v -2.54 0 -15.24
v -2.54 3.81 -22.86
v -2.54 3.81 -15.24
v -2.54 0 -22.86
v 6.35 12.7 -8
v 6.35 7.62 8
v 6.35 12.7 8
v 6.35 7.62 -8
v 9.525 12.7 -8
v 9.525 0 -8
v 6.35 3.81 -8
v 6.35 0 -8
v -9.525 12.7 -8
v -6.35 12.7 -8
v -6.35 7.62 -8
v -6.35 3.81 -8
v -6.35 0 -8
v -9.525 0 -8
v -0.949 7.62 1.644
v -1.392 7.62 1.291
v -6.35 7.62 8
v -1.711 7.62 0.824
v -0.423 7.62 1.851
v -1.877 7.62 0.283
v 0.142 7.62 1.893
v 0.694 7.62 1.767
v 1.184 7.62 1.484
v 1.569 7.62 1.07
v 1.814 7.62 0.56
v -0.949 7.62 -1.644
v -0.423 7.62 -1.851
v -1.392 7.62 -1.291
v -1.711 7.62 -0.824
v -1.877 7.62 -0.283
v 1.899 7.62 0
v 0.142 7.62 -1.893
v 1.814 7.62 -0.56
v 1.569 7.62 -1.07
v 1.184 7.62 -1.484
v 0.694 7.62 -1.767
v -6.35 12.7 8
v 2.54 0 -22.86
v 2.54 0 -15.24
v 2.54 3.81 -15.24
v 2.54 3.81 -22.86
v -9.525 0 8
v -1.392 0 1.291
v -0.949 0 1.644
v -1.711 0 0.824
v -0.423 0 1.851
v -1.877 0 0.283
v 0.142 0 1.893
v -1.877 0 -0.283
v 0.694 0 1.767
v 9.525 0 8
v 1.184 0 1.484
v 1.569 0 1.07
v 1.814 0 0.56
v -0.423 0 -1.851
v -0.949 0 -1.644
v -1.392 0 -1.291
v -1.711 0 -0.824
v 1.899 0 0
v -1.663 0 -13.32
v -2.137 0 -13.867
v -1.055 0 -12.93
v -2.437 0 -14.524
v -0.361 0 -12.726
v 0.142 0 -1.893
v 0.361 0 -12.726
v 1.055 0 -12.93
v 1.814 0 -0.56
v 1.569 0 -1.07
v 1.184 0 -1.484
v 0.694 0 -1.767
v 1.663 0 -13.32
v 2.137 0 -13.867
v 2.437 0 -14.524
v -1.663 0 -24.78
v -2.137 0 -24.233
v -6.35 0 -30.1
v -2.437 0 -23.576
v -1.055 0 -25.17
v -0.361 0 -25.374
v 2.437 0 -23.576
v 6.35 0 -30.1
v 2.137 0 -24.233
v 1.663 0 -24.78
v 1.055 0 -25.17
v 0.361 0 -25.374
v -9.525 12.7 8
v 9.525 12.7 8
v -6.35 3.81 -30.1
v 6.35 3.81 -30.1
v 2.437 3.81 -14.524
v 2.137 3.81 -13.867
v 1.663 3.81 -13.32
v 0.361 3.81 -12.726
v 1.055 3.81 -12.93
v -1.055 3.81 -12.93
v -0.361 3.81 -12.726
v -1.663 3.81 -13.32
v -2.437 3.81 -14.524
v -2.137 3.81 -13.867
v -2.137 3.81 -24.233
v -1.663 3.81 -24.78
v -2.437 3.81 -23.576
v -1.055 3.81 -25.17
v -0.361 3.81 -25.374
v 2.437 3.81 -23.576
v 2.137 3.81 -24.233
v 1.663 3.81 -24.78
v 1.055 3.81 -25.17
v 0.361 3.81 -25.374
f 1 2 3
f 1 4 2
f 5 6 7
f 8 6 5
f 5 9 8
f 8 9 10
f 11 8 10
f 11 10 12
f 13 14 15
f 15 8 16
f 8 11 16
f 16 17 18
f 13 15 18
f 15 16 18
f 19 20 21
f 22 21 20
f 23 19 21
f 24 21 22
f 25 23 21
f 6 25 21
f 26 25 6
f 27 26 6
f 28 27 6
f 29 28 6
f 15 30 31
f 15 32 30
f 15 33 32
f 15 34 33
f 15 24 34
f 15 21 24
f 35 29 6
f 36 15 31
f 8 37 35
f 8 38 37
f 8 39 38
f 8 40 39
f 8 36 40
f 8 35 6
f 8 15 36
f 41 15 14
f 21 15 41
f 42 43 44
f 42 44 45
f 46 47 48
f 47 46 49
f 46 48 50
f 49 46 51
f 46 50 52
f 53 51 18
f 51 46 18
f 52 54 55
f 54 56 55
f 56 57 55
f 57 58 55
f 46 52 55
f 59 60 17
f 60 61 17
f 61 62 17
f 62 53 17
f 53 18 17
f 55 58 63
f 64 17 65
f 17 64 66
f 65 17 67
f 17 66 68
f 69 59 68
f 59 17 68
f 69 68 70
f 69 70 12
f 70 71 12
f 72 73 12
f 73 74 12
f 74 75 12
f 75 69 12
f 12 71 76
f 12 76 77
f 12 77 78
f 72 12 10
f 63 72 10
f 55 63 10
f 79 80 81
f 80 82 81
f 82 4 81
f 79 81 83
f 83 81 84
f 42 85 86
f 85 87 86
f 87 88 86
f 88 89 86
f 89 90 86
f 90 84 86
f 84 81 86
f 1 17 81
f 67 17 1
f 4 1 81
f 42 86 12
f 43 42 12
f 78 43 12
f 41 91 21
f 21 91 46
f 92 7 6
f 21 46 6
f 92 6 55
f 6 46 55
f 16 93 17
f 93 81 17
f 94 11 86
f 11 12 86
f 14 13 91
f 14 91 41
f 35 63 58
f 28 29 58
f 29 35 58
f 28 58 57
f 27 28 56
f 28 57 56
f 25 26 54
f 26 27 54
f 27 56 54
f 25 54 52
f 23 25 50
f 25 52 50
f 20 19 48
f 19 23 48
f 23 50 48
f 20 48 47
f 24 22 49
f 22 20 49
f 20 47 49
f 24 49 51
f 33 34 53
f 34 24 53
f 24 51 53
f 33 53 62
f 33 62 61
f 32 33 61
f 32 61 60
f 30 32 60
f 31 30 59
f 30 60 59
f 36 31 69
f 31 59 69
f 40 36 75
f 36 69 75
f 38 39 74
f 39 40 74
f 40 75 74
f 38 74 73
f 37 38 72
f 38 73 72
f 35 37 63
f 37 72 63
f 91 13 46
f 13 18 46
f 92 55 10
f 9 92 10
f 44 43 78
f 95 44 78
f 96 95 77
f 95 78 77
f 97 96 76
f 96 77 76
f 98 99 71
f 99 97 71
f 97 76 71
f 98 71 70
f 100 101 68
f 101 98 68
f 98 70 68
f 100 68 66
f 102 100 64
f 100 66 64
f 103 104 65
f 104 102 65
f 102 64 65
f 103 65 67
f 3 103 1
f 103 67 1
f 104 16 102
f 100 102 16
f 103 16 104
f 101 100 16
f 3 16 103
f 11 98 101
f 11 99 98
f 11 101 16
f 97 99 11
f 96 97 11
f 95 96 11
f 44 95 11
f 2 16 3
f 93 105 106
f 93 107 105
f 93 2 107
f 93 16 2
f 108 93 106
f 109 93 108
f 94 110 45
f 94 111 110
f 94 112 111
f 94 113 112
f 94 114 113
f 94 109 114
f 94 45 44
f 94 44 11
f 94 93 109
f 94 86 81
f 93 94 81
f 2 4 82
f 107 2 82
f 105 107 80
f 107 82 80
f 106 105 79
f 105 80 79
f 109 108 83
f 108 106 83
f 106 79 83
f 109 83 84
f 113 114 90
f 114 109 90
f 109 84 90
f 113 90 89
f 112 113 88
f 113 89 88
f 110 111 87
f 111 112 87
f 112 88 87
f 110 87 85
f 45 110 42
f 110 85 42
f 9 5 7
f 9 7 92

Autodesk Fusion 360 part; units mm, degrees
sketch "Sketch1" plane through (0, 0, 0) normal (0, 1, 0) x (1, 0, 0) in component "Slider"
  line L0 (9.525, 8) -> (-9.525, 8)
  line L1 (9.525, -8) -> (9.525, 8)
  line L2 (-9.525, -8) -> (9.525, -8)
  line L3 (-9.525, 8) -> (-9.525, -8)
  line L4 (-6.35, 30.1) -> (-6.35, -8)
  line L5 (6.35, 30.1) -> (-6.35, 30.1)
  line L6 (6.35, -8) -> (6.35, 30.1)
  line L7 (-2.54, 22.86) -> (-2.54, 15.24)
  arc A0 (-2.54, 15.24) -> (2.54, 15.24) centre (0, 15.24) ccw
  line L8 (2.54, 15.24) -> (2.54, 22.86)
  arc A1 (2.54, 22.86) -> (-2.54, 22.86) centre (0, 22.86) ccw
  line L9 (0, 25.4) -> (0, 12.7) construction
  circle A2 centre (0, 0) radius 1.8987
  circle A3 centre (0, 0) radius 3.175
  circle A4 centre (0, 0) radius 12.7 construction
  circle A5 centre (0, 15.24) radius 3.9624 construction
  circle A6 centre (0, 22.86) radius 3.9624 construction
  point P0 (0, 0)
  dimension "d2_1" = 5.08
  dimension "d4_1" = 6.35
  dimension "d5_1" = 3.7973
  dimension "d9_1" = 19.05
  dimension "d10_1" = 6.35
  dimension "d12_1" = 6.35
  dimension "d15_1" = 15.24
  dimension "d16_1" = 12.7
  dimension "d19_1" = 9.525
  dimension "d50_1" = 8
  dimension "d51_1" = 8
  dimension "d52_1" = 25.4
  dimension "d53_1" = 7.9248
  dimension "d54_1" = 7.9248
  dimension "d55_1" = 38.1
extrude "Extrude1" add sketch "Sketch1" along normal blind 3.81 contours L0 L2 L4 L6 | L0 L4 L5 L6 in component "Slider"
extrude "Extrude2" add sketch "Sketch1" along normal blind 7.62 contours L0 L2 L4 L6 | A3 in component "Slider"
extrude "Extrude3" add sketch "Sketch1" along normal blind 12.7 contours L0 L1 L2 L6 | L0 L2 L3 L4 in component "Slider"
thread "Thread1" in component "Slider"
component "Slider" placed x (1, 0, 0) y (0, 1, 0) z (0, 0, 1) at (0, 0, 0)
equation "d12_1 = d10_1"
equation "d53_1 = ( 3.9624 * 2 ) * 1 mm"
equation "d54_1 = d53_1"
